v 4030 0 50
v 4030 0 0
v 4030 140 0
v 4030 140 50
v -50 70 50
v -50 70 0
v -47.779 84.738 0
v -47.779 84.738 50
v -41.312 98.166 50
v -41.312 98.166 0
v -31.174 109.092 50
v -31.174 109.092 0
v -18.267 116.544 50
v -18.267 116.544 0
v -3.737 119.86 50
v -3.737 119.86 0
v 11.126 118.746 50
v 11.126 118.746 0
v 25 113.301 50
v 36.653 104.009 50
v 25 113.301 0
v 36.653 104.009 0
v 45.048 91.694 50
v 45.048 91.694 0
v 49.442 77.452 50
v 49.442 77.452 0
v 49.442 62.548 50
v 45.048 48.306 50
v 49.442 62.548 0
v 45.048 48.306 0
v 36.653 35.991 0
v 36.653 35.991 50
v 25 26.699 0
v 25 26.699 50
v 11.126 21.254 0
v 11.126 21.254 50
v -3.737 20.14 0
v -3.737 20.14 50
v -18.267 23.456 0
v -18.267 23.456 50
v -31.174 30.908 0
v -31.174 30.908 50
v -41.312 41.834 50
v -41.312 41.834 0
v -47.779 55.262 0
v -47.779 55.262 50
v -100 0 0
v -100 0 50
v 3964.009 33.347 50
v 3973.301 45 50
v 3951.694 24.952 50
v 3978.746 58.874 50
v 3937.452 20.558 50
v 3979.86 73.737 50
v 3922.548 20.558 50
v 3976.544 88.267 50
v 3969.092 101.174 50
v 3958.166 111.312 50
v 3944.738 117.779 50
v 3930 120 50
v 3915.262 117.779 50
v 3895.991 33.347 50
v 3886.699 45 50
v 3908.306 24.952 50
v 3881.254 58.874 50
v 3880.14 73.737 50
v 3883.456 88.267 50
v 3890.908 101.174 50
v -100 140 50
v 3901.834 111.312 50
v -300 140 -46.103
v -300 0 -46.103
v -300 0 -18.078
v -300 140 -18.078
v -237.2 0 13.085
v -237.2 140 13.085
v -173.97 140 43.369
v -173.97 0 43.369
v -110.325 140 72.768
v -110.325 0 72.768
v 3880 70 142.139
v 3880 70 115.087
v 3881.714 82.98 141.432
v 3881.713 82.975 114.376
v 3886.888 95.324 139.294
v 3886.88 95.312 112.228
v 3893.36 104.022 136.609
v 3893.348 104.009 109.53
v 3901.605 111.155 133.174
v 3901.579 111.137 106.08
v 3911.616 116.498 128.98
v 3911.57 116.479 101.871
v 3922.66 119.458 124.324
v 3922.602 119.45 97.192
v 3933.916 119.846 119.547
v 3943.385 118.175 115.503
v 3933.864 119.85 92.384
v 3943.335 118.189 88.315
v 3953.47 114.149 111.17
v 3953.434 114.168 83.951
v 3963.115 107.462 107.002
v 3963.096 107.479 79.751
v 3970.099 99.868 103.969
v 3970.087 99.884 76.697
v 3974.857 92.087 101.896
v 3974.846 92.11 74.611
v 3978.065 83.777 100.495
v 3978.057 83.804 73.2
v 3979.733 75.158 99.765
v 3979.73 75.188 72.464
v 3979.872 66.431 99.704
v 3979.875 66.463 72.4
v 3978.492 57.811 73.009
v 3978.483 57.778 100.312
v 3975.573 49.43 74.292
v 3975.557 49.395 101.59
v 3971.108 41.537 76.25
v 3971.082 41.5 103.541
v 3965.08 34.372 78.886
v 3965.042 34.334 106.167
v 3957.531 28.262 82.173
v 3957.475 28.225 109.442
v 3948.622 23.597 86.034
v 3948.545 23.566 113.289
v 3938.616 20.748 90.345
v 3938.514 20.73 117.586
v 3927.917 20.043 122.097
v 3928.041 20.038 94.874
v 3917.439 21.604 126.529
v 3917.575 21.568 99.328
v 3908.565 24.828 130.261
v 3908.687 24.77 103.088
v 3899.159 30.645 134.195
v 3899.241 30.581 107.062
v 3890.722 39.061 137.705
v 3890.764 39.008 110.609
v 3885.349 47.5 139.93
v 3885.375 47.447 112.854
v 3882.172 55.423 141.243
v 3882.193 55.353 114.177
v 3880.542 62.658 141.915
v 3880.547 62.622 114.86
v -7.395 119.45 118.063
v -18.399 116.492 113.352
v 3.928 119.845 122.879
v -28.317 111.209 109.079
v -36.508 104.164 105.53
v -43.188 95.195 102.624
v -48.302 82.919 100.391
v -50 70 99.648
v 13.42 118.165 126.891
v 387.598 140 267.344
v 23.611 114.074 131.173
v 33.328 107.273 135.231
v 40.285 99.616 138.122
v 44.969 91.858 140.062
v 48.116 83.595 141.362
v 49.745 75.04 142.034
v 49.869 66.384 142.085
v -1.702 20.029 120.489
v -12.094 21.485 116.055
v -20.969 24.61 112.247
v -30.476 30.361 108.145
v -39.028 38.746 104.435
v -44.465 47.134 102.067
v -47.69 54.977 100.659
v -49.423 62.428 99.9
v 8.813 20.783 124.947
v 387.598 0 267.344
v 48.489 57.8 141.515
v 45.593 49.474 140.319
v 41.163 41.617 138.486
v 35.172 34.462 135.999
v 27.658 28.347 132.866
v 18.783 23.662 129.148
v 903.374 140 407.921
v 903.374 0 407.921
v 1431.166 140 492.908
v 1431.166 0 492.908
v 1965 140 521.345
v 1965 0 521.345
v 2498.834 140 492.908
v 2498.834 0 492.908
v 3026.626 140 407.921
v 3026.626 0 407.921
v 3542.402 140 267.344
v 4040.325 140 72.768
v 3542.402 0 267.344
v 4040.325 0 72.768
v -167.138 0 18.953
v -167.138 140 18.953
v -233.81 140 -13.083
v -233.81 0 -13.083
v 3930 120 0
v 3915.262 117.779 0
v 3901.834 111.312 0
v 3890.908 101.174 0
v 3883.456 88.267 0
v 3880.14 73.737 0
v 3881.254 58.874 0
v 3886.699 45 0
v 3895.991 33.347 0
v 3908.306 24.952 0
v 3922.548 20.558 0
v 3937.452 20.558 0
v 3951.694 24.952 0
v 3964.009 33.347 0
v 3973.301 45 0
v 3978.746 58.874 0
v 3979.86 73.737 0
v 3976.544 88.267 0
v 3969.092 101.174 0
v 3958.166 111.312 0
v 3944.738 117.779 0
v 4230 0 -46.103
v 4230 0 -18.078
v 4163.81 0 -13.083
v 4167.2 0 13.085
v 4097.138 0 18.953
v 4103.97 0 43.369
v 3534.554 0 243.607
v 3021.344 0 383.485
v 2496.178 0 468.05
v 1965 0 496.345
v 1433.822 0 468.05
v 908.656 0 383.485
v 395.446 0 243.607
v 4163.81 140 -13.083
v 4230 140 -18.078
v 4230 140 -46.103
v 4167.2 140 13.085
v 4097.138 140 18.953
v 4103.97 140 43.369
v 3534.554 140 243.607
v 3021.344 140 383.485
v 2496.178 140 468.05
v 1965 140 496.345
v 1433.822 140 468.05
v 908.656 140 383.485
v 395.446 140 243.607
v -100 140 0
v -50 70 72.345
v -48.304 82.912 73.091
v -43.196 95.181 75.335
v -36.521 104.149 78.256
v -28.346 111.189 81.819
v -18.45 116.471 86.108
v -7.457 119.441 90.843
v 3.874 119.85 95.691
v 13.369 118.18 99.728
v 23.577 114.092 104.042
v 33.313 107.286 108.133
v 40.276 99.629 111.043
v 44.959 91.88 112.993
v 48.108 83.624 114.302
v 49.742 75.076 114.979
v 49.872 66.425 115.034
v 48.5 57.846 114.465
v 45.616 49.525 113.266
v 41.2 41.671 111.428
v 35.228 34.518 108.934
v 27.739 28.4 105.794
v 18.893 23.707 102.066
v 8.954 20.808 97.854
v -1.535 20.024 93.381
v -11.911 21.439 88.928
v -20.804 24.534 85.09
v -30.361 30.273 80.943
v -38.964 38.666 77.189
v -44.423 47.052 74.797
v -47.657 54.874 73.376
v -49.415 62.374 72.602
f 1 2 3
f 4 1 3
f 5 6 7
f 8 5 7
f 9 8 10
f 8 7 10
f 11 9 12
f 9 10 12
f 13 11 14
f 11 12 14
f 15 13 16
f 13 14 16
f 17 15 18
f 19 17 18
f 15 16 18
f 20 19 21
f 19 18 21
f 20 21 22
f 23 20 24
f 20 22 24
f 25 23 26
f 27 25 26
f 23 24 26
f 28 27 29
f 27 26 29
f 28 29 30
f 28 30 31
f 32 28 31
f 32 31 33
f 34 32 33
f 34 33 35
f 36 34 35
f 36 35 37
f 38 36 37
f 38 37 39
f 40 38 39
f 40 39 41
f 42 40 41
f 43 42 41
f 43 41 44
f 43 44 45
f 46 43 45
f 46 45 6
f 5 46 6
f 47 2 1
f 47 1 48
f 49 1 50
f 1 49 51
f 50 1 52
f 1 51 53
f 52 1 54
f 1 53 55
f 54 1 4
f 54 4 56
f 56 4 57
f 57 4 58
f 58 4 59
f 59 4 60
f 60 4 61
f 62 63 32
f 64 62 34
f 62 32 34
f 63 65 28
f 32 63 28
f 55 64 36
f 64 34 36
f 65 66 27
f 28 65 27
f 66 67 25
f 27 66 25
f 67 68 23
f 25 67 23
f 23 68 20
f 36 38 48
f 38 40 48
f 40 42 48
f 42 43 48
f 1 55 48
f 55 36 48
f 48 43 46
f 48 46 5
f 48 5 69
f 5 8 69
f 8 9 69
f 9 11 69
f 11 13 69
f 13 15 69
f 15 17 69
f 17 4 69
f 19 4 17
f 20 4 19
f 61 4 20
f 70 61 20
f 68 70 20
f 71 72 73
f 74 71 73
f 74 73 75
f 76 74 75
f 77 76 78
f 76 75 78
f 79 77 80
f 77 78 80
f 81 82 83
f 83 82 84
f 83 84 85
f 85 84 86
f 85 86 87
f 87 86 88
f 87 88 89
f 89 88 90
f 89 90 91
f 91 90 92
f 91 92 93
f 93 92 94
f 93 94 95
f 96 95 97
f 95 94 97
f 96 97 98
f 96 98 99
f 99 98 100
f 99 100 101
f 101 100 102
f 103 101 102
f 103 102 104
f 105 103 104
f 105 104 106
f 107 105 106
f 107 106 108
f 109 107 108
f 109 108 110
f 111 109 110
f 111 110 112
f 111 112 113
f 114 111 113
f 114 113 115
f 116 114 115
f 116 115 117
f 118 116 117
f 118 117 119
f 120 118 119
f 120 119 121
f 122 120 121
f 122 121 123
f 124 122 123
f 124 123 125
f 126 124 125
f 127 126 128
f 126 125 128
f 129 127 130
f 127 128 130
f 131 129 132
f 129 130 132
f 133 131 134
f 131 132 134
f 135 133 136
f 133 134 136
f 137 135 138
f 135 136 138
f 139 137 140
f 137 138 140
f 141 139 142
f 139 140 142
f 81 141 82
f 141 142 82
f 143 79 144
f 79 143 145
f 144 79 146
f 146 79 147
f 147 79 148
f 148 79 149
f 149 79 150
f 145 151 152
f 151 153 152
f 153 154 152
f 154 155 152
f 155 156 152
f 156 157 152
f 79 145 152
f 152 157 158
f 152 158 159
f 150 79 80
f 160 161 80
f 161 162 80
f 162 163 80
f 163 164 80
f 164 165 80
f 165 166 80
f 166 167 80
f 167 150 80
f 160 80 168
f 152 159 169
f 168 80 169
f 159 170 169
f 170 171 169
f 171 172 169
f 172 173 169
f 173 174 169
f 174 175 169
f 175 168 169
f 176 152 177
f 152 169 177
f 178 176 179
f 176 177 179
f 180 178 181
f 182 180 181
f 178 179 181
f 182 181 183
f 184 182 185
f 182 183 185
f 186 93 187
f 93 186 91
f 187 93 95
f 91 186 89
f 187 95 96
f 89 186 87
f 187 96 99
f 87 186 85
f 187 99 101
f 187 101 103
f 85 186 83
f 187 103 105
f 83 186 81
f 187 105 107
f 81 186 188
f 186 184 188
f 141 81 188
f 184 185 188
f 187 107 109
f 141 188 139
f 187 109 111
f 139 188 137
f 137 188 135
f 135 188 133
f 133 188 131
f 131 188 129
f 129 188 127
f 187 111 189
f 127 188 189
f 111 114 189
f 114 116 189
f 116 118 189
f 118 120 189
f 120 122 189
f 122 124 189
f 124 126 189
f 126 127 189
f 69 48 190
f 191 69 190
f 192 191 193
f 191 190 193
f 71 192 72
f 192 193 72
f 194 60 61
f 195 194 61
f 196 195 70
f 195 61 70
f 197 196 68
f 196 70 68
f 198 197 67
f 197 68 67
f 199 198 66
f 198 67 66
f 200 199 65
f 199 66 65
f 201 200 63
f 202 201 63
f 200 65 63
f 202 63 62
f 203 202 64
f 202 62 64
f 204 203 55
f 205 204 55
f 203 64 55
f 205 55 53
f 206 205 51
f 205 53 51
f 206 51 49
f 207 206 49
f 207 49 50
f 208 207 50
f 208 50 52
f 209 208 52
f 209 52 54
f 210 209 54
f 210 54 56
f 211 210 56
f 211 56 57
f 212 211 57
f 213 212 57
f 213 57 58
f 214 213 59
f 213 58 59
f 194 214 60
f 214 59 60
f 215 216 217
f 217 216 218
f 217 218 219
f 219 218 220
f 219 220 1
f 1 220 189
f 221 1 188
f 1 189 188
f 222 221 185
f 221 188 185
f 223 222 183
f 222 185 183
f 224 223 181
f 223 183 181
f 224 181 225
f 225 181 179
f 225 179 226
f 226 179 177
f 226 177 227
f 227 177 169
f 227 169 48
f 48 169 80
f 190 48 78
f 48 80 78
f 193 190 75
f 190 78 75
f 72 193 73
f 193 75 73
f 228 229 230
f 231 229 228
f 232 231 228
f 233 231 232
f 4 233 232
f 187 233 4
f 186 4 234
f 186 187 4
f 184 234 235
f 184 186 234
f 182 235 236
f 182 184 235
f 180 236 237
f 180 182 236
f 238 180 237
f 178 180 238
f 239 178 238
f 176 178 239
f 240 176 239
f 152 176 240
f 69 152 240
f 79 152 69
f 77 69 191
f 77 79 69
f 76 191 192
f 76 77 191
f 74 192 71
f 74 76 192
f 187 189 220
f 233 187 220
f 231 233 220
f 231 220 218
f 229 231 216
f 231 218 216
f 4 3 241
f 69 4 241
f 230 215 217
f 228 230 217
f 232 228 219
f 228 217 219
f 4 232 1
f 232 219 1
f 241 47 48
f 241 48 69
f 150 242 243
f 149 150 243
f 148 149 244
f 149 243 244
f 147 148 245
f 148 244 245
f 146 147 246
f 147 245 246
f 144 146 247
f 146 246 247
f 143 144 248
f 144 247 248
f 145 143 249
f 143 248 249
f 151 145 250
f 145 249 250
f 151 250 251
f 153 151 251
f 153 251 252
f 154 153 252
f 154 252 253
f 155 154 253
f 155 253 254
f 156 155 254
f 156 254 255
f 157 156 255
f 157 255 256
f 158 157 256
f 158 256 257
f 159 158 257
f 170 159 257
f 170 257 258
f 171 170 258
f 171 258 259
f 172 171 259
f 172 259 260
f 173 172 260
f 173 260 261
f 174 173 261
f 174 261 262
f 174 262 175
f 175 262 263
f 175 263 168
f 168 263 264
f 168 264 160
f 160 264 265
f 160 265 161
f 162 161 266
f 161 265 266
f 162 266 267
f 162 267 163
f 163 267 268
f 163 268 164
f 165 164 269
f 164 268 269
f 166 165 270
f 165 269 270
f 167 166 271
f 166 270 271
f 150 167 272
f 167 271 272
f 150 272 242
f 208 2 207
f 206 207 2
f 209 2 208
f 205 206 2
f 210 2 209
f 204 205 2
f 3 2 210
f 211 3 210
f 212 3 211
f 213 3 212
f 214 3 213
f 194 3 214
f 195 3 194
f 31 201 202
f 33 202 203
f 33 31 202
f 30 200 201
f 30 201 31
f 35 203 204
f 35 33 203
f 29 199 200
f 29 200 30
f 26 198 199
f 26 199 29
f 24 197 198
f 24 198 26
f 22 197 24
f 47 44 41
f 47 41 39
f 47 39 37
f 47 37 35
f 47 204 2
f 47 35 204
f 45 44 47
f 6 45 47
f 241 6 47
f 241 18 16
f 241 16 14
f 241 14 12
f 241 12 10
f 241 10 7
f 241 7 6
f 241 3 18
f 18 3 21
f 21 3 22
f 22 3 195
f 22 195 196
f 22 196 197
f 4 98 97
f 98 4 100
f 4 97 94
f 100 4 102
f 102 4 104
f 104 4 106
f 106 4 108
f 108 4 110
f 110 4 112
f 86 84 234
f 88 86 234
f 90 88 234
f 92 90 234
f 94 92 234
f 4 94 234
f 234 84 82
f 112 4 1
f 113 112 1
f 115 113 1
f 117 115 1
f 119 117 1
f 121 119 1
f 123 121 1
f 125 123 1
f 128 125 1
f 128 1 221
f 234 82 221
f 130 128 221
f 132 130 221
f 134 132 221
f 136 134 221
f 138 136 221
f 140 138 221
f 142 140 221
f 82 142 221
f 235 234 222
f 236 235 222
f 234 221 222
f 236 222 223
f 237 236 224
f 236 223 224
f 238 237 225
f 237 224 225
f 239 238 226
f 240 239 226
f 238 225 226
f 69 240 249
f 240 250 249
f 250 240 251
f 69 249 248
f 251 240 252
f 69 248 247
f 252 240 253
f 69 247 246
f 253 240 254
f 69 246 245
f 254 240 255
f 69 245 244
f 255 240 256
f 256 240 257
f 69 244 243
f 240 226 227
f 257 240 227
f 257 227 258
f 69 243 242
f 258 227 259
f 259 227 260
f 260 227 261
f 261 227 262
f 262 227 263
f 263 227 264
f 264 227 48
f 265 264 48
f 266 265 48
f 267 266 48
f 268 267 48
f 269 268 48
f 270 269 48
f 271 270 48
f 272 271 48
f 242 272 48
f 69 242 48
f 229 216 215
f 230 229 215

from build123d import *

# Parameters (mm, degrees)
SKETCH1_W           = 3930
SKETCH1_H           = 140
BOSS_EXTRUDE1_DEPTH = 50
SKETCH2_R           = 50
CUT_EXTRUDE1_DEPTH  = 50
SKETCH3_W           = 100
SKETCH3_H           = 140
BOSS_EXTRUDE2_DEPTH = 50
SKETCH4_R           = 50
CUT_EXTRUDE2_DEPTH  = 51
BOSS_EXTRUDE3_DEPTH = 140
SKETCH6_R           = 50
CUT_EXTRUDE3_DEPTH  = 522.344874719


with BuildPart() as part:
    # Sketch1 → Boss-Extrude1 (new body)
    with BuildSketch(Plane.XY):
        with Locations((1965, 70)):
            Rectangle(SKETCH1_W, SKETCH1_H)
    extrude(amount=BOSS_EXTRUDE1_DEPTH)

    # Sketch2 → Cut-Extrude1 (cut)
    with BuildSketch(Plane.XY.offset(50)):
        with Locations((3930, 70)):
            Circle(SKETCH2_R)
        with Locations((0, 70)):
            Circle(SKETCH2_R)
    extrude(amount=-CUT_EXTRUDE1_DEPTH, mode=Mode.SUBTRACT)

    # Sketch3 → Boss-Extrude2 (add, through all)
    with BuildSketch(Plane(origin=(0, 0, 0), x_dir=(-1, 0, 0), z_dir=(0, 0, -1))):
        with Locations((-3980, 70)):
            Rectangle(SKETCH3_W, SKETCH3_H)
        with Locations((50, 70)):
            Rectangle(SKETCH3_W, SKETCH3_H)
    extrude(amount=-BOSS_EXTRUDE2_DEPTH)

    # Sketch4 → Cut-Extrude2 (cut, through all)
    with BuildSketch(Plane(origin=(0, 0, 0), x_dir=(-1, 0, 0), z_dir=(0, 0, -1))):
        with Locations((0, 70)):
            Circle(SKETCH4_R)
        with Locations((-3930, 70)):
            Circle(SKETCH4_R)
    extrude(amount=-CUT_EXTRUDE2_DEPTH, mode=Mode.SUBTRACT)


with BuildPart() as body_2:
    # Sketch5 → Boss-Extrude3 (new body, through all)
    with BuildSketch(Plane.XZ):
        with BuildLine():
            Line((-300, -46.10254567), (-300, -18.078239305))
            ThreePointArc((-300, -18.078239305), (-205.637820717, 28.337422294), (-110.325, 72.768275626))
            ThreePointArc((-110.325, 72.768275626), (1965, 521.344874719), (4040.325, 72.768275626))
            ThreePointArc((4040.325, 72.768275626), (4135.637820717, 28.337422294), (4230, -18.078239305))
            Line((4230, -18.078239305), (4230, -46.10254567))
            ThreePointArc((4230, -46.10254567), (4130.533173337, 3.0583197), (4030, 50))
            ThreePointArc((4030, 50), (1965, 496.344874719), (-100, 50))
            ThreePointArc((-100, 50), (-200.533173337, 3.0583197), (-300, -46.10254567))
        make_face()
    extrude(amount=-BOSS_EXTRUDE3_DEPTH)

    # Sketch6 → Cut-Extrude3 (cut, through all)
    with BuildSketch(Plane(origin=(0, 0, 0), x_dir=(-1, 0, 0), z_dir=(0, 0, -1))):
        with Locations((-3930, 70)):
            Circle(SKETCH6_R)
        with Locations((0, 70)):
            Circle(SKETCH6_R)
    extrude(amount=-CUT_EXTRUDE3_DEPTH, mode=Mode.SUBTRACT)


solid = Compound([part.part, body_2.part])
